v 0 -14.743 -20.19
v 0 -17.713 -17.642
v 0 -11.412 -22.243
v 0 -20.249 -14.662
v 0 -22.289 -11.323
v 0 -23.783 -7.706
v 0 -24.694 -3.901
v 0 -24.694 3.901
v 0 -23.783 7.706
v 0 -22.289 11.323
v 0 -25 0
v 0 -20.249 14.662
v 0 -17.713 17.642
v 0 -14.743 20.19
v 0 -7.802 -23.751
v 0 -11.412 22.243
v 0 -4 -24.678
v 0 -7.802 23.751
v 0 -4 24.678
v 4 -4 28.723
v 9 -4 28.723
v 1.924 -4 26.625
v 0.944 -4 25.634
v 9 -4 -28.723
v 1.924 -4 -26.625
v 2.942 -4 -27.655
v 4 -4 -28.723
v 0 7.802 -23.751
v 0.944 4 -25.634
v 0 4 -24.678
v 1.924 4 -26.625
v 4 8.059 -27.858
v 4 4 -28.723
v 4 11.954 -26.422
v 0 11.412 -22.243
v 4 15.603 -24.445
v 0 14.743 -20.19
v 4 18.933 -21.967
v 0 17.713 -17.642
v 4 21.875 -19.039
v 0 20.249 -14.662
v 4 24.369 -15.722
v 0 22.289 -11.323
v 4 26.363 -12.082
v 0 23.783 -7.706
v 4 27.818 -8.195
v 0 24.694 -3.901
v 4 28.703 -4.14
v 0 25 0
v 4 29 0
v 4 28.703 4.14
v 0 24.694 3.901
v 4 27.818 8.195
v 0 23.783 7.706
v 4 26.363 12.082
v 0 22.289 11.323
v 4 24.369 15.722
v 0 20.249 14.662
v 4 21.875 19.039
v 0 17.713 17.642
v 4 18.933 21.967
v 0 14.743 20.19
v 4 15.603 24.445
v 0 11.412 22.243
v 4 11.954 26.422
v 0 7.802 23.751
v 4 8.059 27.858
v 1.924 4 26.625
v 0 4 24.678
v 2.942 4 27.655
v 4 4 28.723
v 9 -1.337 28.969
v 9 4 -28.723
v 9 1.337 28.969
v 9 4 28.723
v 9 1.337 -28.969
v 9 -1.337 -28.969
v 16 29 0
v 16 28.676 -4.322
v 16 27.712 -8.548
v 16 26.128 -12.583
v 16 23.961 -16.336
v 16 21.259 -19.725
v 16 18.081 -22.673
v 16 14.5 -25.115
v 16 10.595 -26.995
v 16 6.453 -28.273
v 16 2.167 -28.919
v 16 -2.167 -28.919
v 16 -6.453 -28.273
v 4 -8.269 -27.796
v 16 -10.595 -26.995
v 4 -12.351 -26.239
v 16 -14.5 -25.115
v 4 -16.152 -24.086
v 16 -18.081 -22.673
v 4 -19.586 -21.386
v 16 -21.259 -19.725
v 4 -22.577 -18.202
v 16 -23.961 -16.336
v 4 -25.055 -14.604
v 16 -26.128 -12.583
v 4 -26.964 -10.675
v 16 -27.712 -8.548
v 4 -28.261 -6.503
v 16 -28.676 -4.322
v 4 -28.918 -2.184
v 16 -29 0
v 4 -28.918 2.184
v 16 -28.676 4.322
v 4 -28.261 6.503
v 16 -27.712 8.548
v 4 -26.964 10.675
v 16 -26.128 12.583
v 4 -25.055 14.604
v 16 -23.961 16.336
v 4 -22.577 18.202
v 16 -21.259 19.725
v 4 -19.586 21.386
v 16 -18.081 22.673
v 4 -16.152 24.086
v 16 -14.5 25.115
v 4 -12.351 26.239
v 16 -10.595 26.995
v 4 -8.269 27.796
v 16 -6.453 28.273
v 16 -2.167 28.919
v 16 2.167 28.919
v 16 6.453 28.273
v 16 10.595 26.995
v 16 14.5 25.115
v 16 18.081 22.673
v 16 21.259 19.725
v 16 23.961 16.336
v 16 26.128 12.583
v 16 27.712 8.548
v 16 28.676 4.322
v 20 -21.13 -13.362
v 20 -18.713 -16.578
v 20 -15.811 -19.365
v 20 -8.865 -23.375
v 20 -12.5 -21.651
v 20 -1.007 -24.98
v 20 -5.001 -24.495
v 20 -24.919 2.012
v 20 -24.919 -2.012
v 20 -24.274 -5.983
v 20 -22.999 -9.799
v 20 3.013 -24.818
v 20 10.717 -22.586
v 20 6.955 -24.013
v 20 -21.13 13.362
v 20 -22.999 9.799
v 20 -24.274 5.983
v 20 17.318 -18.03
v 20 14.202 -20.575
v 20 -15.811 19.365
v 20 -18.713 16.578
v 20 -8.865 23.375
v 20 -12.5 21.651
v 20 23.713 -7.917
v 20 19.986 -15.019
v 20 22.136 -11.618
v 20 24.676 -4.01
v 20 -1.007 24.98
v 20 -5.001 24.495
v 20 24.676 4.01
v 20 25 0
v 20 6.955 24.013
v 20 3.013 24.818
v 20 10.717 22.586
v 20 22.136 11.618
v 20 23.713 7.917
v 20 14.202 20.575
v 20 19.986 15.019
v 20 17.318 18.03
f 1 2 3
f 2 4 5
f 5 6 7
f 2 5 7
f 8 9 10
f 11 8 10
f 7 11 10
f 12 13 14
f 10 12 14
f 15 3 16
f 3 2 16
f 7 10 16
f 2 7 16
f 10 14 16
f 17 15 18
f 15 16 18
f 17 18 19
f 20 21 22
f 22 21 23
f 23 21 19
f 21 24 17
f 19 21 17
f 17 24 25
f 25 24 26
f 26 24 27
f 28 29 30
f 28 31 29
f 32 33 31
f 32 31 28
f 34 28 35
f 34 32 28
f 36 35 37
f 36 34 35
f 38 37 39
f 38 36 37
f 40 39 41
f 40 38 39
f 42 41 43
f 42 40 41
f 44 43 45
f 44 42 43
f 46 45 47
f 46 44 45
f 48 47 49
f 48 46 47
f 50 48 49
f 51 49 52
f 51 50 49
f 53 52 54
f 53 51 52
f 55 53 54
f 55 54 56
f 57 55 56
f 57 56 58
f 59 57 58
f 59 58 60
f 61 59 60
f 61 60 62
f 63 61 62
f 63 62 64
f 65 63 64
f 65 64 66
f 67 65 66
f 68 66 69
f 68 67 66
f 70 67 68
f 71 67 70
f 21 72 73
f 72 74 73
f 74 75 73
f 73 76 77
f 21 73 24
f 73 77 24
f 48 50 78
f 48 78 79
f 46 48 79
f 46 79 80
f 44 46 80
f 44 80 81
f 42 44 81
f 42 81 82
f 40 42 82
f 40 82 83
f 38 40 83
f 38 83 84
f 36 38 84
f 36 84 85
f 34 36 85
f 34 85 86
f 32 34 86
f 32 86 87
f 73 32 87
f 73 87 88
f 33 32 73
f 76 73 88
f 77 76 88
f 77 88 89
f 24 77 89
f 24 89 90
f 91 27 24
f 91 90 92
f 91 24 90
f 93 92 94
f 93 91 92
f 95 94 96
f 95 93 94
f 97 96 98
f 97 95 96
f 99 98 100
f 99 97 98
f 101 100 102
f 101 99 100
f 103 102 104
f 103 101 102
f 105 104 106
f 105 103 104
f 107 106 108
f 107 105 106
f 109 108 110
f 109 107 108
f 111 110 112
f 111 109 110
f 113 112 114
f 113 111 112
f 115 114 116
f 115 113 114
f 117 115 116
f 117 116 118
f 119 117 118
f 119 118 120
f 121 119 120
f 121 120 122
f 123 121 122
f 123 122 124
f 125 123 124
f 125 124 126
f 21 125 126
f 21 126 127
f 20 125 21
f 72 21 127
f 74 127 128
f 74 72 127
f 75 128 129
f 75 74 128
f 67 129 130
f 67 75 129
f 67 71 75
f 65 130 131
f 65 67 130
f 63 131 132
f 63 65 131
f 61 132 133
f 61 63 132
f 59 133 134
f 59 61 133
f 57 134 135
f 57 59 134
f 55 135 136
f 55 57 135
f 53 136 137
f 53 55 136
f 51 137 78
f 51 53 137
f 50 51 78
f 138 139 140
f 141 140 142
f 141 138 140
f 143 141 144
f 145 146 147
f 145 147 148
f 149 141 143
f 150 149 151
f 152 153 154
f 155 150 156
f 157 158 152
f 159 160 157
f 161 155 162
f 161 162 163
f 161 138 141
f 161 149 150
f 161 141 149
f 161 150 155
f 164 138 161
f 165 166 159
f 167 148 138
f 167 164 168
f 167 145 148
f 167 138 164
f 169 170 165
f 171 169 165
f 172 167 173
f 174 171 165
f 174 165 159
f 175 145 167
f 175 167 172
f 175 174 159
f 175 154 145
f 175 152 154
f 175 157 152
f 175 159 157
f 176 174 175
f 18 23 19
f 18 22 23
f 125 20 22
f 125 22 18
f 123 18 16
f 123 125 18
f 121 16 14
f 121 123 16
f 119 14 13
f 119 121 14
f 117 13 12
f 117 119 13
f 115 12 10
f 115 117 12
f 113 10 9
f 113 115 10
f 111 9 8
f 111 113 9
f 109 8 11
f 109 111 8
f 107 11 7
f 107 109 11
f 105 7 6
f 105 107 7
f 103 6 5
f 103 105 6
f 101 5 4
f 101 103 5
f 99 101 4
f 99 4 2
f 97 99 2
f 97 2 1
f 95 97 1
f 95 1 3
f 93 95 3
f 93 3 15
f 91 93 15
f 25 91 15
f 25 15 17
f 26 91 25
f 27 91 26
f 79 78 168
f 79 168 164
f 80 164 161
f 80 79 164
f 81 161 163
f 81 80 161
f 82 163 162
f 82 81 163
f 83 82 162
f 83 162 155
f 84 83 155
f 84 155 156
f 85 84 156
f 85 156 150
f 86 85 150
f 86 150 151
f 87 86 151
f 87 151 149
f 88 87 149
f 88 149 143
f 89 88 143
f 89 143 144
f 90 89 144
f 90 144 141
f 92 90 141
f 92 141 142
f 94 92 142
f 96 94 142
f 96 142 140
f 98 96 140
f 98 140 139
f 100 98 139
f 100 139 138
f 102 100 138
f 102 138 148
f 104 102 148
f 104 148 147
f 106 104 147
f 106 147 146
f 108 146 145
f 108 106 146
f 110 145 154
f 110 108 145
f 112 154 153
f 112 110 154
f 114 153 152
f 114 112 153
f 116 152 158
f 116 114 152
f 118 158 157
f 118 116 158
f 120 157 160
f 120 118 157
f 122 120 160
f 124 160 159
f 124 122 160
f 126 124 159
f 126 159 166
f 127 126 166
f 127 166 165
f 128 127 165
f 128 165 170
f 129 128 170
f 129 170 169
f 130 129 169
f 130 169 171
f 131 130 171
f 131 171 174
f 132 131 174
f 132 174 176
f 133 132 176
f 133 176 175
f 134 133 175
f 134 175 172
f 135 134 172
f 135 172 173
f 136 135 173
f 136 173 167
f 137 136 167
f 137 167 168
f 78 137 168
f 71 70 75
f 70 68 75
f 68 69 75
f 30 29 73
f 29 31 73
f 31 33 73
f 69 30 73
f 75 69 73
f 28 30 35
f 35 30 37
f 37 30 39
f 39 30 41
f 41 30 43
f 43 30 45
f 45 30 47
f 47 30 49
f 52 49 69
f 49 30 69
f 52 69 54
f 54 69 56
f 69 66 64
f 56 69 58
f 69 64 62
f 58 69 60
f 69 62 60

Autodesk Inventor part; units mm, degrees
ref_plane "YZ Plane" through (0, 0, 0) normal (1, 0, 0) x (0, 1, 0)
ref_plane "XZ Plane" through (0, 0, 0) normal (0, 1, 0) x (-1, 0, 0)
ref_plane "XY Plane" through (0, 0, 0) normal (0, 0, 1) x (1, 0, 0)
sketch "Эскиз1" plane through (0, 0, 0) normal (0, 0, 1) x (1, 0, 0)
  line L0 (0, 0) -> (20, 0)
  line L1 (20, 0) -> (20, 25)
  line L2 (16, 29) -> (4, 29)
  line L3 (0, 25) -> (0, 0)
  line L4 (4, 29) -> (0, 25)
  line L5 (16, 29) -> (20, 25)
  point P0 (20, 29)
  point P1 (0, 29)
  dimension "d12" = 20
  dimension "d13" = 29
  dimension "d14" = 4
  dimension "d15" = 4
  dimension "d16" = 4
  dimension "d17" = 4
revolve "Вращение2" add sketch "Эскиз1" angle 360 about axis through (0, 0, 0) along (1, 0, 0)
sketch "Эскиз4" plane through (0, 0, 0) normal (0, 0, 1) x (1, 0, 0)
  line L0 (0, -25) -> (0, 25) construction
  line L1 (0, 4) -> (9, 4)
  line L2 (9, 4) -> (9, -4)
  line L3 (9, -4) -> (0, -4)
  line L4 (0, -4) -> (0, 4)
  point P0 (0, 0)
  point P1 (0, 0)
  point P2 (0, 0)
  dimension "d23" = 9
  dimension "d24" = 8
extrude "Выдавливание3" cut sketch "Эскиз4" along normal through all both and the other way through all
equation "\"d15\" = d14"
equation "\"d16\" = d14"
equation "\"d17\" = d16"
properties part number "711113"
